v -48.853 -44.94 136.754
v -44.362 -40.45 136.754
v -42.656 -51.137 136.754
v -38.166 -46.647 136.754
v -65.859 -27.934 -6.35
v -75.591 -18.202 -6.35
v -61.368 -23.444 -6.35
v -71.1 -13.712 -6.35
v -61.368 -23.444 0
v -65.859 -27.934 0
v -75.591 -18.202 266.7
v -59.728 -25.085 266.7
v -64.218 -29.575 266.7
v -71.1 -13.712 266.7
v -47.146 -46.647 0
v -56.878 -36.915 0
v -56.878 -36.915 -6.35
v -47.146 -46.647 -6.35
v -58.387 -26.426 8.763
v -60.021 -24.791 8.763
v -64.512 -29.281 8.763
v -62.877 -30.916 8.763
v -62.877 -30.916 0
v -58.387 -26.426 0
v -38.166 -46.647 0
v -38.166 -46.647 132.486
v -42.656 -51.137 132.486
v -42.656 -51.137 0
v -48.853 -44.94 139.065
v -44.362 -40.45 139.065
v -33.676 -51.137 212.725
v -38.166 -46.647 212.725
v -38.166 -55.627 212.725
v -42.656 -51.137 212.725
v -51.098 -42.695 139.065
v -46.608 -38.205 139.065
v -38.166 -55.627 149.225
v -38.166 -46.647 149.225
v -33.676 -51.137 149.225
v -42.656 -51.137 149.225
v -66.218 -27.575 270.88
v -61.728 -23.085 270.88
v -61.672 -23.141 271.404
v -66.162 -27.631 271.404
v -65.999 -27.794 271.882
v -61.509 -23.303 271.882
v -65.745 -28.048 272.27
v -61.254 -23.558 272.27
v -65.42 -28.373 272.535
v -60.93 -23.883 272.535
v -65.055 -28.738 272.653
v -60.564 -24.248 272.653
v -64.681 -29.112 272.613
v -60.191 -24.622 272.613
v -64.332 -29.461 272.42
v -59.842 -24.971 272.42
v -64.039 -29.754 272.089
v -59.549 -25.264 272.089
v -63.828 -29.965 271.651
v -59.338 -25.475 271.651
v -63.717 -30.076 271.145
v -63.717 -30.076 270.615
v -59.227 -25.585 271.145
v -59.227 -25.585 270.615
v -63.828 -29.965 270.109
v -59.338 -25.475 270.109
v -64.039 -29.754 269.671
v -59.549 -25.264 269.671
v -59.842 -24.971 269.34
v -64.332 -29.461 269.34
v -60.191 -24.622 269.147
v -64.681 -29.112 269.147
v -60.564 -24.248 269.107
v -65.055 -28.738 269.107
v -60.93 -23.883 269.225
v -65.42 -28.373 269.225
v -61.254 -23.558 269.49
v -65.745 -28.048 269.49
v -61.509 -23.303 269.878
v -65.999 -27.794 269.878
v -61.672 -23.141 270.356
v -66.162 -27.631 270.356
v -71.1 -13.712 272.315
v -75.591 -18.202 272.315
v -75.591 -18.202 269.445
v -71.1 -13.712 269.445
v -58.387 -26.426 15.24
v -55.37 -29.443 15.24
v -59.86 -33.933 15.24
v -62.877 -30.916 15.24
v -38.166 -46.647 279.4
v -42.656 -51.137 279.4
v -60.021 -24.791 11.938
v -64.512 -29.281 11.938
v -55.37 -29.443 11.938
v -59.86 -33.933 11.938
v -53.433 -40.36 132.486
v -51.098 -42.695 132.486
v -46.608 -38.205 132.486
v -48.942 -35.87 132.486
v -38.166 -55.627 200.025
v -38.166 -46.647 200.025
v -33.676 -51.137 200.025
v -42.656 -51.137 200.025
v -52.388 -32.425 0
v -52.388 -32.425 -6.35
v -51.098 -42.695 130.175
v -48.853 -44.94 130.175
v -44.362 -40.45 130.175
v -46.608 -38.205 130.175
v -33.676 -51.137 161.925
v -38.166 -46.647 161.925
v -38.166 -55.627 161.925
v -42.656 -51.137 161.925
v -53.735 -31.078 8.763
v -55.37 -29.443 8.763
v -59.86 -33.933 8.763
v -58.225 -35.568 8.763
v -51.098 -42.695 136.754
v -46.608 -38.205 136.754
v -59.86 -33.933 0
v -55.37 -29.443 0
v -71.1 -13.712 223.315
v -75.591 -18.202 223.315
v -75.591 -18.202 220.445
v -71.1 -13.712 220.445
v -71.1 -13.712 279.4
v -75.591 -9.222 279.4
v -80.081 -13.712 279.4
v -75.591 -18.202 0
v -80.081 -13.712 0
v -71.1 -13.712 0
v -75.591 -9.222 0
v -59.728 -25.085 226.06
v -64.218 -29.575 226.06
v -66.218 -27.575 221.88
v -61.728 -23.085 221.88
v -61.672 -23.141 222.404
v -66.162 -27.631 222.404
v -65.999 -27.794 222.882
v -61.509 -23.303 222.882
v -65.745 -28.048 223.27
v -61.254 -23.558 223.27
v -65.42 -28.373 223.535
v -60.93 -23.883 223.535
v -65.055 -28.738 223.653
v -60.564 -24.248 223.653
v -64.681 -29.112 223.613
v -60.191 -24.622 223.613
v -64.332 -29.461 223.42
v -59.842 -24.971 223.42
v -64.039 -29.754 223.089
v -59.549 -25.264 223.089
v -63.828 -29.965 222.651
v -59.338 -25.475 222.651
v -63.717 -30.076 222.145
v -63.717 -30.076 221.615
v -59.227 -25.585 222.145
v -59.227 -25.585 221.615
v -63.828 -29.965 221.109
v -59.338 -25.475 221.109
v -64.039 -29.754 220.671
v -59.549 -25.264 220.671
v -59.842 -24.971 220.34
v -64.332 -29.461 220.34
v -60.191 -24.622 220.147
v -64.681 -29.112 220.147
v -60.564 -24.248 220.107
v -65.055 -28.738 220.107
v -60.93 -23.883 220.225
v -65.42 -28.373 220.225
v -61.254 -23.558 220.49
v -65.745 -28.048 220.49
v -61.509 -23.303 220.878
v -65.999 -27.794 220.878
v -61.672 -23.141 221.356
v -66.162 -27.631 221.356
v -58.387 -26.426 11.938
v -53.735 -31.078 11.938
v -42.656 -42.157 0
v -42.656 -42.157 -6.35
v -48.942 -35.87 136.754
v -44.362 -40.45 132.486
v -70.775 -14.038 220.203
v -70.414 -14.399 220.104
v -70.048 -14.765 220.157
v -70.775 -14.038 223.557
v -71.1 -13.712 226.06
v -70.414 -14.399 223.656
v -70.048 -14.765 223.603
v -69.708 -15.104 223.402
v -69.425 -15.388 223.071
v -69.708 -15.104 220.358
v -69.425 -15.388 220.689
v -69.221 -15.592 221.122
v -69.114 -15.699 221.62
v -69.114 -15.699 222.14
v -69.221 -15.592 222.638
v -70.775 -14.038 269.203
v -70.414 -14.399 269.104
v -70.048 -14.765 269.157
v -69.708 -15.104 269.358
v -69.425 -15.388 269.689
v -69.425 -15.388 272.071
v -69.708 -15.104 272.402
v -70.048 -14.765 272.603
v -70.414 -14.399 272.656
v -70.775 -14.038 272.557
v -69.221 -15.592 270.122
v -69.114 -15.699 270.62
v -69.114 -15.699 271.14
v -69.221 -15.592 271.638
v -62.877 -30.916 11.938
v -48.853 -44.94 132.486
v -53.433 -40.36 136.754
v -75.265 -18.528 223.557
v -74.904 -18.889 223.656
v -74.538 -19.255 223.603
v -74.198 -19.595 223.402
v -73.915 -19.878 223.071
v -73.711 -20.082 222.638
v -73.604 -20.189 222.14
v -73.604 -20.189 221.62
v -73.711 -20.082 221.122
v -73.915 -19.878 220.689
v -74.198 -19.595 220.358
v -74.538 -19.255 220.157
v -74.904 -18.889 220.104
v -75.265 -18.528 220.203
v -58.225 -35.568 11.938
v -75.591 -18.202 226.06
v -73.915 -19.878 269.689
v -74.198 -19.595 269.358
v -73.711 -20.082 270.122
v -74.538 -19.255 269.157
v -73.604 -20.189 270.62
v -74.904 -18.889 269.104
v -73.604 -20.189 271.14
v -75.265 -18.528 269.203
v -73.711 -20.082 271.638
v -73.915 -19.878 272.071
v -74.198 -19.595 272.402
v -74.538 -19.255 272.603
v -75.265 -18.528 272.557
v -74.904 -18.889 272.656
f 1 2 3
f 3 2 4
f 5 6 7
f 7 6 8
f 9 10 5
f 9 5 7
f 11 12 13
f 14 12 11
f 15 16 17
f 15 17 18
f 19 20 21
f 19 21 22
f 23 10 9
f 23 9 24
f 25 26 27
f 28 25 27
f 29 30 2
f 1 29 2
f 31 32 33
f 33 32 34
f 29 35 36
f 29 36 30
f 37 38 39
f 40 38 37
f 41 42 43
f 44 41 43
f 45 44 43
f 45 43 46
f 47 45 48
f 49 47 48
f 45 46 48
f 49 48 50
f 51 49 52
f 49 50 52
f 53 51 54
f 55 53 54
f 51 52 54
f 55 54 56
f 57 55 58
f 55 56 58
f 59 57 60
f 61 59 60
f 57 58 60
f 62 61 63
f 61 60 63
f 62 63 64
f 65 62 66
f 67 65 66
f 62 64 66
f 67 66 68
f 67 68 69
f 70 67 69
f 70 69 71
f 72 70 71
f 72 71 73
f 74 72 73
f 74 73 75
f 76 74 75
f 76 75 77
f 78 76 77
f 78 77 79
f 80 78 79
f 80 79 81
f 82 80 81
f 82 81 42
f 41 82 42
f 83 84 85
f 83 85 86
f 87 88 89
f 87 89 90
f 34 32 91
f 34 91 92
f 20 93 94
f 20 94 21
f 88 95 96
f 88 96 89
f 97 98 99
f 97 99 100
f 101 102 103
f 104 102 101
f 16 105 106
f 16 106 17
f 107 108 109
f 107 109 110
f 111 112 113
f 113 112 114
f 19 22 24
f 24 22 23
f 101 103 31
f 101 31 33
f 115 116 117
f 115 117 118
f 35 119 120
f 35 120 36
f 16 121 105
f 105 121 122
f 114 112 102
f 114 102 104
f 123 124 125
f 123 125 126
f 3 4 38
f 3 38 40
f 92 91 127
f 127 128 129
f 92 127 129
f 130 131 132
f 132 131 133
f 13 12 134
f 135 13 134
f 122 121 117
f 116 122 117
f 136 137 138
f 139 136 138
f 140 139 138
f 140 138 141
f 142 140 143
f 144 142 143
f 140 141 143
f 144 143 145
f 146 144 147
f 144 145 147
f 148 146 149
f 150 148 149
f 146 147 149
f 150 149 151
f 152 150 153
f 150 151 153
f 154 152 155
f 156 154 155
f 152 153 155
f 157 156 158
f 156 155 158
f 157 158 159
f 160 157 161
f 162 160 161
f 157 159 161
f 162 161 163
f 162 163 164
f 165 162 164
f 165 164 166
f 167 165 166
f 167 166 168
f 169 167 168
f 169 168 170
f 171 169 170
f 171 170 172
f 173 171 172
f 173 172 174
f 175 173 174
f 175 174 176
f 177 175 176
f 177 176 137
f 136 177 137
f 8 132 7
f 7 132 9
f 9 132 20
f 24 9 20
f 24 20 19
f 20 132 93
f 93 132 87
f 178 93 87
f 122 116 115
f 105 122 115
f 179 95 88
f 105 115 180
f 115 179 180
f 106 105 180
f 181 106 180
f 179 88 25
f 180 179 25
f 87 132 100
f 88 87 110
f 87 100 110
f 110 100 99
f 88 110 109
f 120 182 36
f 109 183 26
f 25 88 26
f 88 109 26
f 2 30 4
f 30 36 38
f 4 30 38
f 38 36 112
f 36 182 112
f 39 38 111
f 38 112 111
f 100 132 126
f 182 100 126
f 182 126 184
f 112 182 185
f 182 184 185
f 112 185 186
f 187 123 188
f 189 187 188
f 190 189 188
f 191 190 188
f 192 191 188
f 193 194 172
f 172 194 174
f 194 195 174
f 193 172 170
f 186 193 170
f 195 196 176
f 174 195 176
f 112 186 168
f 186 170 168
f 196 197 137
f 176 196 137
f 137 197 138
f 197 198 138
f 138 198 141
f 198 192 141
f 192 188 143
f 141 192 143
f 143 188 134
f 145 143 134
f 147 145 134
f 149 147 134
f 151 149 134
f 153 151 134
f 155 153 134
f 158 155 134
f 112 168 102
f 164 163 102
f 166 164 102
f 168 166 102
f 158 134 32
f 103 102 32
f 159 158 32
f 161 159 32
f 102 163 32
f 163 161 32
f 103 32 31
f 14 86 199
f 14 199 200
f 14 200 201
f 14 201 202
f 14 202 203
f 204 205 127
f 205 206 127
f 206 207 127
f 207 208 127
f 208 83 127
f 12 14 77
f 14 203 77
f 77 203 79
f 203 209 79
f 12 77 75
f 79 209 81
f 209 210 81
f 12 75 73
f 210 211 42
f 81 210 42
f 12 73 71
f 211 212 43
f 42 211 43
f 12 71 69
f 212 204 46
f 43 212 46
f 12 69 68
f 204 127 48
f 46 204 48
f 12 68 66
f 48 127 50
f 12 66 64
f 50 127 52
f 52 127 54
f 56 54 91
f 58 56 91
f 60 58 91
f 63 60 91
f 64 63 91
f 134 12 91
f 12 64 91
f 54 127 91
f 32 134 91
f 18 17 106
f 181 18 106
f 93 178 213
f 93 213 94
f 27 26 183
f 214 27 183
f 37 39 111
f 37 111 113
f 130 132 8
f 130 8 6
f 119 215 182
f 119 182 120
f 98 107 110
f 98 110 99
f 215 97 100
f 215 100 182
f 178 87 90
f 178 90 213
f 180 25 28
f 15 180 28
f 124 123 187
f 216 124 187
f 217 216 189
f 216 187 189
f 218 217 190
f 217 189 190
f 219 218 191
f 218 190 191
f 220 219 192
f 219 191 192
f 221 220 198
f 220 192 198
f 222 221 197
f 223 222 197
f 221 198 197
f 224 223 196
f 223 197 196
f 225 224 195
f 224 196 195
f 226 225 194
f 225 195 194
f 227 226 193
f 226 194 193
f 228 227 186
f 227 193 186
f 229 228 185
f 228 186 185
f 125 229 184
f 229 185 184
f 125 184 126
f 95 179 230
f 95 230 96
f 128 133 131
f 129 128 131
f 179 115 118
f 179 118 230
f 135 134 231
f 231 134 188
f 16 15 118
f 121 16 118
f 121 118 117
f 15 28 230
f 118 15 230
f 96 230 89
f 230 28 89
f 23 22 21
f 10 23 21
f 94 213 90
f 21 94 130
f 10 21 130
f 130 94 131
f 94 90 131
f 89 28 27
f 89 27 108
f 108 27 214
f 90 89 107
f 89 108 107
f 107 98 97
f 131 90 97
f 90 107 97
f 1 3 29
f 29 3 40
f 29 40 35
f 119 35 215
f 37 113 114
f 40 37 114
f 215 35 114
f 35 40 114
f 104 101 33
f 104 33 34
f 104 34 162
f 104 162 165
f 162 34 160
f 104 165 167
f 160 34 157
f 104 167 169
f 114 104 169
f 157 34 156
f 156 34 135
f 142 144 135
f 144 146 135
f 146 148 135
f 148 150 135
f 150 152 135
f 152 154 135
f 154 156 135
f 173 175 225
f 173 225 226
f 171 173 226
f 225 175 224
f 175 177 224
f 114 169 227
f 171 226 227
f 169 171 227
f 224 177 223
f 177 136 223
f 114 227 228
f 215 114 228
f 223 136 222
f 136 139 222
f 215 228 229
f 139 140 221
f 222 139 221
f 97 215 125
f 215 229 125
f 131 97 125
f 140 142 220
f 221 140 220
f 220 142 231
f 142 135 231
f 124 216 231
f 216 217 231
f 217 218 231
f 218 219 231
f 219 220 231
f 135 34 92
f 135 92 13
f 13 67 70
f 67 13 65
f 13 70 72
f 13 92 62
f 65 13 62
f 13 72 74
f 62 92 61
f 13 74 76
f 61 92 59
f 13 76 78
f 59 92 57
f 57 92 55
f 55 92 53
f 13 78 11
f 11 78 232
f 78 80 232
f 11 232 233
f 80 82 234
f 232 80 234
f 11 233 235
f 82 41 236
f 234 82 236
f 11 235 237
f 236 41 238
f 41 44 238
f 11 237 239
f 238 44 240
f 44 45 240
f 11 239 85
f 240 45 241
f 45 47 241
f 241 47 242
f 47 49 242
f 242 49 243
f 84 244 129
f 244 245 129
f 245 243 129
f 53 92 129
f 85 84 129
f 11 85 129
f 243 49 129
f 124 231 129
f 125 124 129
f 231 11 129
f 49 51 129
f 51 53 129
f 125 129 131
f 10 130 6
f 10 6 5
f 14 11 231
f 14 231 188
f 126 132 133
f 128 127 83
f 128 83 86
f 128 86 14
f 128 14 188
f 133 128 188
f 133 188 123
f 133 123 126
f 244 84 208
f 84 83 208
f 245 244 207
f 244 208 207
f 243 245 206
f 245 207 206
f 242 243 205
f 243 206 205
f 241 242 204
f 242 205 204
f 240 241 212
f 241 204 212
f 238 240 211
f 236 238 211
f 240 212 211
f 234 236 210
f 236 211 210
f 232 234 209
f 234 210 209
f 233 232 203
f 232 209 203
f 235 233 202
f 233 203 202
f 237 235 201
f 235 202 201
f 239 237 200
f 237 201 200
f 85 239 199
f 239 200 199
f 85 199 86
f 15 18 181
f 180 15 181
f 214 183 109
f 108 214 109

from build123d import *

# Parameters (mm, degrees)
BASE_EXTRUSION_DEPTH                     = 279.4
BASE_T_SLOT_DEPTH                        = 283.823092451
BASE_TABS_DEPTH                          = 6.35
SKETCH5_W                                = 40.64
SKETCH5_H                                = 20.066
SERVO_SLOT_DEPTH                         = 283.823092451
SKETCH6_R                                = 1.778
SERVO_MOUNTING_HOLES_DEPTH               = 283.823092451
FILLER_EXTRUSION_TO_FUNNEL_SUPPORT_DEPTH = 279.4
SIDE_T_SLOT_DEPTH                        = 284.874808603
SKETCH9_W                                = 6.35
SKETCH9_H                                = 12.7
SIDE_TABS_DEPTH                          = 6.35


with BuildPart() as part:
    # Sketch2 → Base Extrusion (new body)
    with BuildSketch(Plane.XY):
        Polygon((-71.1004567, -13.712301035), (-75.59058476, -18.202429096), (-47.146344636, -46.64666922), (-42.656216575, -42.15654116), align=None)
    extrude(amount=BASE_EXTRUSION_DEPTH)

    # Sketch3 → Base T Slot (cut, through all)
    with BuildSketch(Plane(origin=(-46.896506928, -46.896506928, 0), x_dir=(0, 0, 1), z_dir=(-0.7071067811865479, -0.7071067811865472, 0))):
        Polygon((0, 22.600038952), (0, 18.332838952), (8.763, 18.332838952), (8.763, 16.021438952), (11.938, 16.021438952), (11.938, 18.332838952), (15.24, 18.332838952), (15.24, 22.600038952), (11.938, 22.600038952), (11.938, 24.911438952), (8.763, 24.911438952), (8.763, 22.600038952), align=None)
    extrude(amount=-BASE_T_SLOT_DEPTH, mode=Mode.SUBTRACT)

    # Sketch4 → Base Tabs (add)
    with BuildSketch(Plane(origin=(0, 0, 0), x_dir=(-1, 0, 0), z_dir=(0, 0, -1))):
        Polygon((75.59058476, -18.202429096), (65.858592758, -27.934421097), (61.368464698, -23.444293037), (71.1004567, -13.712301035), align=None)
        Polygon((42.656216575, -42.15654116), (52.388208577, -32.424549158), (56.878336637, -36.914677218), (47.146344636, -46.64666922), align=None)
    extrude(amount=BASE_TABS_DEPTH)

    # Sketch5 → Servo Slot (cut, through all)
    with BuildSketch(Plane(origin=(-42.406378867, -42.406378867, 0), x_dir=(0, 0, -1), z_dir=(0.7071067811865476, 0.7071067811865476, 0))):
        with Locations((-246.38, 34.529271287)):
            Rectangle(SKETCH5_W, SKETCH5_H)
    extrude(amount=-SERVO_SLOT_DEPTH, mode=Mode.SUBTRACT)

    # Sketch6 → Servo Mounting Holes (cut, through all)
    with BuildSketch(Plane(origin=(-42.406378867, -42.406378867, 0), x_dir=(0, 0, -1), z_dir=(0.7071067811865476, 0.7071067811865476, 0))):
        with Locations((-270.88, 39.529271287)):
            Circle(SKETCH6_R)
        with Locations(Location((-270.88, 25.54655403, 0), (0, 0, 90))):
            Circle(SKETCH6_R)
        with Locations((-221.88, 39.529271287)):
            Circle(SKETCH6_R)
        with Locations(Location((-221.88, 25.54655403, 0), (0, 0, 90))):
            Circle(SKETCH6_R)
    extrude(amount=-SERVO_MOUNTING_HOLES_DEPTH, mode=Mode.SUBTRACT)

    # Sketch7 → Filler Extrusion to Funnel Support (add)
    with BuildSketch(Plane.XY.offset(279.4)):
        Polygon((-47.146344636, -46.64666922), (-42.656216575, -42.15654116), (-38.166088515, -46.64666922), (-42.656216575, -51.136797281), align=None)
        Polygon((-75.59058476, -18.202429096), (-71.1004567, -13.712301035), (-75.59058476, -9.222172974), (-80.080712821, -13.712301035), align=None)
    extrude(amount=-FILLER_EXTRUSION_TO_FUNNEL_SUPPORT_DEPTH)

    # Sketch8 → Side T Slot (cut, through all)
    with BuildSketch(Plane(origin=(-42.406378867, -42.406378867, 0), x_dir=(0.7071067811865477, -0.7071067811865474, 0), z_dir=(0.7071067811865474, 0.7071067811865477, 0))):
        Polygon((5.996676125, -136.7536), (5.996676125, -132.4864), (-2.766323875, -132.4864), (-2.766323875, -130.175), (-5.941323875, -130.175), (-5.941323875, -132.4864), (-9.243323875, -132.4864), (-9.243323875, -136.7536), (-5.941323875, -136.7536), (-5.941323875, -139.065), (-2.766323875, -139.065), (-2.766323875, -136.7536), align=None)
    extrude(amount=-SIDE_T_SLOT_DEPTH, mode=Mode.SUBTRACT)

    # Sketch9 → Side Tabs (add)
    with BuildSketch(Plane(origin=(4.240290353, -4.240290353, 0), x_dir=(-0.7071067811865475, -0.7071067811865477, 0), z_dir=(0.7071067811865477, -0.7071067811865475, 0))):
        with Locations((63.146676125, -206.375)):
            Rectangle(SKETCH9_W, SKETCH9_H)
        with Locations((63.146676125, -155.575)):
            Rectangle(SKETCH9_W, SKETCH9_H)
    extrude(amount=SIDE_TABS_DEPTH)


solid = part.part
